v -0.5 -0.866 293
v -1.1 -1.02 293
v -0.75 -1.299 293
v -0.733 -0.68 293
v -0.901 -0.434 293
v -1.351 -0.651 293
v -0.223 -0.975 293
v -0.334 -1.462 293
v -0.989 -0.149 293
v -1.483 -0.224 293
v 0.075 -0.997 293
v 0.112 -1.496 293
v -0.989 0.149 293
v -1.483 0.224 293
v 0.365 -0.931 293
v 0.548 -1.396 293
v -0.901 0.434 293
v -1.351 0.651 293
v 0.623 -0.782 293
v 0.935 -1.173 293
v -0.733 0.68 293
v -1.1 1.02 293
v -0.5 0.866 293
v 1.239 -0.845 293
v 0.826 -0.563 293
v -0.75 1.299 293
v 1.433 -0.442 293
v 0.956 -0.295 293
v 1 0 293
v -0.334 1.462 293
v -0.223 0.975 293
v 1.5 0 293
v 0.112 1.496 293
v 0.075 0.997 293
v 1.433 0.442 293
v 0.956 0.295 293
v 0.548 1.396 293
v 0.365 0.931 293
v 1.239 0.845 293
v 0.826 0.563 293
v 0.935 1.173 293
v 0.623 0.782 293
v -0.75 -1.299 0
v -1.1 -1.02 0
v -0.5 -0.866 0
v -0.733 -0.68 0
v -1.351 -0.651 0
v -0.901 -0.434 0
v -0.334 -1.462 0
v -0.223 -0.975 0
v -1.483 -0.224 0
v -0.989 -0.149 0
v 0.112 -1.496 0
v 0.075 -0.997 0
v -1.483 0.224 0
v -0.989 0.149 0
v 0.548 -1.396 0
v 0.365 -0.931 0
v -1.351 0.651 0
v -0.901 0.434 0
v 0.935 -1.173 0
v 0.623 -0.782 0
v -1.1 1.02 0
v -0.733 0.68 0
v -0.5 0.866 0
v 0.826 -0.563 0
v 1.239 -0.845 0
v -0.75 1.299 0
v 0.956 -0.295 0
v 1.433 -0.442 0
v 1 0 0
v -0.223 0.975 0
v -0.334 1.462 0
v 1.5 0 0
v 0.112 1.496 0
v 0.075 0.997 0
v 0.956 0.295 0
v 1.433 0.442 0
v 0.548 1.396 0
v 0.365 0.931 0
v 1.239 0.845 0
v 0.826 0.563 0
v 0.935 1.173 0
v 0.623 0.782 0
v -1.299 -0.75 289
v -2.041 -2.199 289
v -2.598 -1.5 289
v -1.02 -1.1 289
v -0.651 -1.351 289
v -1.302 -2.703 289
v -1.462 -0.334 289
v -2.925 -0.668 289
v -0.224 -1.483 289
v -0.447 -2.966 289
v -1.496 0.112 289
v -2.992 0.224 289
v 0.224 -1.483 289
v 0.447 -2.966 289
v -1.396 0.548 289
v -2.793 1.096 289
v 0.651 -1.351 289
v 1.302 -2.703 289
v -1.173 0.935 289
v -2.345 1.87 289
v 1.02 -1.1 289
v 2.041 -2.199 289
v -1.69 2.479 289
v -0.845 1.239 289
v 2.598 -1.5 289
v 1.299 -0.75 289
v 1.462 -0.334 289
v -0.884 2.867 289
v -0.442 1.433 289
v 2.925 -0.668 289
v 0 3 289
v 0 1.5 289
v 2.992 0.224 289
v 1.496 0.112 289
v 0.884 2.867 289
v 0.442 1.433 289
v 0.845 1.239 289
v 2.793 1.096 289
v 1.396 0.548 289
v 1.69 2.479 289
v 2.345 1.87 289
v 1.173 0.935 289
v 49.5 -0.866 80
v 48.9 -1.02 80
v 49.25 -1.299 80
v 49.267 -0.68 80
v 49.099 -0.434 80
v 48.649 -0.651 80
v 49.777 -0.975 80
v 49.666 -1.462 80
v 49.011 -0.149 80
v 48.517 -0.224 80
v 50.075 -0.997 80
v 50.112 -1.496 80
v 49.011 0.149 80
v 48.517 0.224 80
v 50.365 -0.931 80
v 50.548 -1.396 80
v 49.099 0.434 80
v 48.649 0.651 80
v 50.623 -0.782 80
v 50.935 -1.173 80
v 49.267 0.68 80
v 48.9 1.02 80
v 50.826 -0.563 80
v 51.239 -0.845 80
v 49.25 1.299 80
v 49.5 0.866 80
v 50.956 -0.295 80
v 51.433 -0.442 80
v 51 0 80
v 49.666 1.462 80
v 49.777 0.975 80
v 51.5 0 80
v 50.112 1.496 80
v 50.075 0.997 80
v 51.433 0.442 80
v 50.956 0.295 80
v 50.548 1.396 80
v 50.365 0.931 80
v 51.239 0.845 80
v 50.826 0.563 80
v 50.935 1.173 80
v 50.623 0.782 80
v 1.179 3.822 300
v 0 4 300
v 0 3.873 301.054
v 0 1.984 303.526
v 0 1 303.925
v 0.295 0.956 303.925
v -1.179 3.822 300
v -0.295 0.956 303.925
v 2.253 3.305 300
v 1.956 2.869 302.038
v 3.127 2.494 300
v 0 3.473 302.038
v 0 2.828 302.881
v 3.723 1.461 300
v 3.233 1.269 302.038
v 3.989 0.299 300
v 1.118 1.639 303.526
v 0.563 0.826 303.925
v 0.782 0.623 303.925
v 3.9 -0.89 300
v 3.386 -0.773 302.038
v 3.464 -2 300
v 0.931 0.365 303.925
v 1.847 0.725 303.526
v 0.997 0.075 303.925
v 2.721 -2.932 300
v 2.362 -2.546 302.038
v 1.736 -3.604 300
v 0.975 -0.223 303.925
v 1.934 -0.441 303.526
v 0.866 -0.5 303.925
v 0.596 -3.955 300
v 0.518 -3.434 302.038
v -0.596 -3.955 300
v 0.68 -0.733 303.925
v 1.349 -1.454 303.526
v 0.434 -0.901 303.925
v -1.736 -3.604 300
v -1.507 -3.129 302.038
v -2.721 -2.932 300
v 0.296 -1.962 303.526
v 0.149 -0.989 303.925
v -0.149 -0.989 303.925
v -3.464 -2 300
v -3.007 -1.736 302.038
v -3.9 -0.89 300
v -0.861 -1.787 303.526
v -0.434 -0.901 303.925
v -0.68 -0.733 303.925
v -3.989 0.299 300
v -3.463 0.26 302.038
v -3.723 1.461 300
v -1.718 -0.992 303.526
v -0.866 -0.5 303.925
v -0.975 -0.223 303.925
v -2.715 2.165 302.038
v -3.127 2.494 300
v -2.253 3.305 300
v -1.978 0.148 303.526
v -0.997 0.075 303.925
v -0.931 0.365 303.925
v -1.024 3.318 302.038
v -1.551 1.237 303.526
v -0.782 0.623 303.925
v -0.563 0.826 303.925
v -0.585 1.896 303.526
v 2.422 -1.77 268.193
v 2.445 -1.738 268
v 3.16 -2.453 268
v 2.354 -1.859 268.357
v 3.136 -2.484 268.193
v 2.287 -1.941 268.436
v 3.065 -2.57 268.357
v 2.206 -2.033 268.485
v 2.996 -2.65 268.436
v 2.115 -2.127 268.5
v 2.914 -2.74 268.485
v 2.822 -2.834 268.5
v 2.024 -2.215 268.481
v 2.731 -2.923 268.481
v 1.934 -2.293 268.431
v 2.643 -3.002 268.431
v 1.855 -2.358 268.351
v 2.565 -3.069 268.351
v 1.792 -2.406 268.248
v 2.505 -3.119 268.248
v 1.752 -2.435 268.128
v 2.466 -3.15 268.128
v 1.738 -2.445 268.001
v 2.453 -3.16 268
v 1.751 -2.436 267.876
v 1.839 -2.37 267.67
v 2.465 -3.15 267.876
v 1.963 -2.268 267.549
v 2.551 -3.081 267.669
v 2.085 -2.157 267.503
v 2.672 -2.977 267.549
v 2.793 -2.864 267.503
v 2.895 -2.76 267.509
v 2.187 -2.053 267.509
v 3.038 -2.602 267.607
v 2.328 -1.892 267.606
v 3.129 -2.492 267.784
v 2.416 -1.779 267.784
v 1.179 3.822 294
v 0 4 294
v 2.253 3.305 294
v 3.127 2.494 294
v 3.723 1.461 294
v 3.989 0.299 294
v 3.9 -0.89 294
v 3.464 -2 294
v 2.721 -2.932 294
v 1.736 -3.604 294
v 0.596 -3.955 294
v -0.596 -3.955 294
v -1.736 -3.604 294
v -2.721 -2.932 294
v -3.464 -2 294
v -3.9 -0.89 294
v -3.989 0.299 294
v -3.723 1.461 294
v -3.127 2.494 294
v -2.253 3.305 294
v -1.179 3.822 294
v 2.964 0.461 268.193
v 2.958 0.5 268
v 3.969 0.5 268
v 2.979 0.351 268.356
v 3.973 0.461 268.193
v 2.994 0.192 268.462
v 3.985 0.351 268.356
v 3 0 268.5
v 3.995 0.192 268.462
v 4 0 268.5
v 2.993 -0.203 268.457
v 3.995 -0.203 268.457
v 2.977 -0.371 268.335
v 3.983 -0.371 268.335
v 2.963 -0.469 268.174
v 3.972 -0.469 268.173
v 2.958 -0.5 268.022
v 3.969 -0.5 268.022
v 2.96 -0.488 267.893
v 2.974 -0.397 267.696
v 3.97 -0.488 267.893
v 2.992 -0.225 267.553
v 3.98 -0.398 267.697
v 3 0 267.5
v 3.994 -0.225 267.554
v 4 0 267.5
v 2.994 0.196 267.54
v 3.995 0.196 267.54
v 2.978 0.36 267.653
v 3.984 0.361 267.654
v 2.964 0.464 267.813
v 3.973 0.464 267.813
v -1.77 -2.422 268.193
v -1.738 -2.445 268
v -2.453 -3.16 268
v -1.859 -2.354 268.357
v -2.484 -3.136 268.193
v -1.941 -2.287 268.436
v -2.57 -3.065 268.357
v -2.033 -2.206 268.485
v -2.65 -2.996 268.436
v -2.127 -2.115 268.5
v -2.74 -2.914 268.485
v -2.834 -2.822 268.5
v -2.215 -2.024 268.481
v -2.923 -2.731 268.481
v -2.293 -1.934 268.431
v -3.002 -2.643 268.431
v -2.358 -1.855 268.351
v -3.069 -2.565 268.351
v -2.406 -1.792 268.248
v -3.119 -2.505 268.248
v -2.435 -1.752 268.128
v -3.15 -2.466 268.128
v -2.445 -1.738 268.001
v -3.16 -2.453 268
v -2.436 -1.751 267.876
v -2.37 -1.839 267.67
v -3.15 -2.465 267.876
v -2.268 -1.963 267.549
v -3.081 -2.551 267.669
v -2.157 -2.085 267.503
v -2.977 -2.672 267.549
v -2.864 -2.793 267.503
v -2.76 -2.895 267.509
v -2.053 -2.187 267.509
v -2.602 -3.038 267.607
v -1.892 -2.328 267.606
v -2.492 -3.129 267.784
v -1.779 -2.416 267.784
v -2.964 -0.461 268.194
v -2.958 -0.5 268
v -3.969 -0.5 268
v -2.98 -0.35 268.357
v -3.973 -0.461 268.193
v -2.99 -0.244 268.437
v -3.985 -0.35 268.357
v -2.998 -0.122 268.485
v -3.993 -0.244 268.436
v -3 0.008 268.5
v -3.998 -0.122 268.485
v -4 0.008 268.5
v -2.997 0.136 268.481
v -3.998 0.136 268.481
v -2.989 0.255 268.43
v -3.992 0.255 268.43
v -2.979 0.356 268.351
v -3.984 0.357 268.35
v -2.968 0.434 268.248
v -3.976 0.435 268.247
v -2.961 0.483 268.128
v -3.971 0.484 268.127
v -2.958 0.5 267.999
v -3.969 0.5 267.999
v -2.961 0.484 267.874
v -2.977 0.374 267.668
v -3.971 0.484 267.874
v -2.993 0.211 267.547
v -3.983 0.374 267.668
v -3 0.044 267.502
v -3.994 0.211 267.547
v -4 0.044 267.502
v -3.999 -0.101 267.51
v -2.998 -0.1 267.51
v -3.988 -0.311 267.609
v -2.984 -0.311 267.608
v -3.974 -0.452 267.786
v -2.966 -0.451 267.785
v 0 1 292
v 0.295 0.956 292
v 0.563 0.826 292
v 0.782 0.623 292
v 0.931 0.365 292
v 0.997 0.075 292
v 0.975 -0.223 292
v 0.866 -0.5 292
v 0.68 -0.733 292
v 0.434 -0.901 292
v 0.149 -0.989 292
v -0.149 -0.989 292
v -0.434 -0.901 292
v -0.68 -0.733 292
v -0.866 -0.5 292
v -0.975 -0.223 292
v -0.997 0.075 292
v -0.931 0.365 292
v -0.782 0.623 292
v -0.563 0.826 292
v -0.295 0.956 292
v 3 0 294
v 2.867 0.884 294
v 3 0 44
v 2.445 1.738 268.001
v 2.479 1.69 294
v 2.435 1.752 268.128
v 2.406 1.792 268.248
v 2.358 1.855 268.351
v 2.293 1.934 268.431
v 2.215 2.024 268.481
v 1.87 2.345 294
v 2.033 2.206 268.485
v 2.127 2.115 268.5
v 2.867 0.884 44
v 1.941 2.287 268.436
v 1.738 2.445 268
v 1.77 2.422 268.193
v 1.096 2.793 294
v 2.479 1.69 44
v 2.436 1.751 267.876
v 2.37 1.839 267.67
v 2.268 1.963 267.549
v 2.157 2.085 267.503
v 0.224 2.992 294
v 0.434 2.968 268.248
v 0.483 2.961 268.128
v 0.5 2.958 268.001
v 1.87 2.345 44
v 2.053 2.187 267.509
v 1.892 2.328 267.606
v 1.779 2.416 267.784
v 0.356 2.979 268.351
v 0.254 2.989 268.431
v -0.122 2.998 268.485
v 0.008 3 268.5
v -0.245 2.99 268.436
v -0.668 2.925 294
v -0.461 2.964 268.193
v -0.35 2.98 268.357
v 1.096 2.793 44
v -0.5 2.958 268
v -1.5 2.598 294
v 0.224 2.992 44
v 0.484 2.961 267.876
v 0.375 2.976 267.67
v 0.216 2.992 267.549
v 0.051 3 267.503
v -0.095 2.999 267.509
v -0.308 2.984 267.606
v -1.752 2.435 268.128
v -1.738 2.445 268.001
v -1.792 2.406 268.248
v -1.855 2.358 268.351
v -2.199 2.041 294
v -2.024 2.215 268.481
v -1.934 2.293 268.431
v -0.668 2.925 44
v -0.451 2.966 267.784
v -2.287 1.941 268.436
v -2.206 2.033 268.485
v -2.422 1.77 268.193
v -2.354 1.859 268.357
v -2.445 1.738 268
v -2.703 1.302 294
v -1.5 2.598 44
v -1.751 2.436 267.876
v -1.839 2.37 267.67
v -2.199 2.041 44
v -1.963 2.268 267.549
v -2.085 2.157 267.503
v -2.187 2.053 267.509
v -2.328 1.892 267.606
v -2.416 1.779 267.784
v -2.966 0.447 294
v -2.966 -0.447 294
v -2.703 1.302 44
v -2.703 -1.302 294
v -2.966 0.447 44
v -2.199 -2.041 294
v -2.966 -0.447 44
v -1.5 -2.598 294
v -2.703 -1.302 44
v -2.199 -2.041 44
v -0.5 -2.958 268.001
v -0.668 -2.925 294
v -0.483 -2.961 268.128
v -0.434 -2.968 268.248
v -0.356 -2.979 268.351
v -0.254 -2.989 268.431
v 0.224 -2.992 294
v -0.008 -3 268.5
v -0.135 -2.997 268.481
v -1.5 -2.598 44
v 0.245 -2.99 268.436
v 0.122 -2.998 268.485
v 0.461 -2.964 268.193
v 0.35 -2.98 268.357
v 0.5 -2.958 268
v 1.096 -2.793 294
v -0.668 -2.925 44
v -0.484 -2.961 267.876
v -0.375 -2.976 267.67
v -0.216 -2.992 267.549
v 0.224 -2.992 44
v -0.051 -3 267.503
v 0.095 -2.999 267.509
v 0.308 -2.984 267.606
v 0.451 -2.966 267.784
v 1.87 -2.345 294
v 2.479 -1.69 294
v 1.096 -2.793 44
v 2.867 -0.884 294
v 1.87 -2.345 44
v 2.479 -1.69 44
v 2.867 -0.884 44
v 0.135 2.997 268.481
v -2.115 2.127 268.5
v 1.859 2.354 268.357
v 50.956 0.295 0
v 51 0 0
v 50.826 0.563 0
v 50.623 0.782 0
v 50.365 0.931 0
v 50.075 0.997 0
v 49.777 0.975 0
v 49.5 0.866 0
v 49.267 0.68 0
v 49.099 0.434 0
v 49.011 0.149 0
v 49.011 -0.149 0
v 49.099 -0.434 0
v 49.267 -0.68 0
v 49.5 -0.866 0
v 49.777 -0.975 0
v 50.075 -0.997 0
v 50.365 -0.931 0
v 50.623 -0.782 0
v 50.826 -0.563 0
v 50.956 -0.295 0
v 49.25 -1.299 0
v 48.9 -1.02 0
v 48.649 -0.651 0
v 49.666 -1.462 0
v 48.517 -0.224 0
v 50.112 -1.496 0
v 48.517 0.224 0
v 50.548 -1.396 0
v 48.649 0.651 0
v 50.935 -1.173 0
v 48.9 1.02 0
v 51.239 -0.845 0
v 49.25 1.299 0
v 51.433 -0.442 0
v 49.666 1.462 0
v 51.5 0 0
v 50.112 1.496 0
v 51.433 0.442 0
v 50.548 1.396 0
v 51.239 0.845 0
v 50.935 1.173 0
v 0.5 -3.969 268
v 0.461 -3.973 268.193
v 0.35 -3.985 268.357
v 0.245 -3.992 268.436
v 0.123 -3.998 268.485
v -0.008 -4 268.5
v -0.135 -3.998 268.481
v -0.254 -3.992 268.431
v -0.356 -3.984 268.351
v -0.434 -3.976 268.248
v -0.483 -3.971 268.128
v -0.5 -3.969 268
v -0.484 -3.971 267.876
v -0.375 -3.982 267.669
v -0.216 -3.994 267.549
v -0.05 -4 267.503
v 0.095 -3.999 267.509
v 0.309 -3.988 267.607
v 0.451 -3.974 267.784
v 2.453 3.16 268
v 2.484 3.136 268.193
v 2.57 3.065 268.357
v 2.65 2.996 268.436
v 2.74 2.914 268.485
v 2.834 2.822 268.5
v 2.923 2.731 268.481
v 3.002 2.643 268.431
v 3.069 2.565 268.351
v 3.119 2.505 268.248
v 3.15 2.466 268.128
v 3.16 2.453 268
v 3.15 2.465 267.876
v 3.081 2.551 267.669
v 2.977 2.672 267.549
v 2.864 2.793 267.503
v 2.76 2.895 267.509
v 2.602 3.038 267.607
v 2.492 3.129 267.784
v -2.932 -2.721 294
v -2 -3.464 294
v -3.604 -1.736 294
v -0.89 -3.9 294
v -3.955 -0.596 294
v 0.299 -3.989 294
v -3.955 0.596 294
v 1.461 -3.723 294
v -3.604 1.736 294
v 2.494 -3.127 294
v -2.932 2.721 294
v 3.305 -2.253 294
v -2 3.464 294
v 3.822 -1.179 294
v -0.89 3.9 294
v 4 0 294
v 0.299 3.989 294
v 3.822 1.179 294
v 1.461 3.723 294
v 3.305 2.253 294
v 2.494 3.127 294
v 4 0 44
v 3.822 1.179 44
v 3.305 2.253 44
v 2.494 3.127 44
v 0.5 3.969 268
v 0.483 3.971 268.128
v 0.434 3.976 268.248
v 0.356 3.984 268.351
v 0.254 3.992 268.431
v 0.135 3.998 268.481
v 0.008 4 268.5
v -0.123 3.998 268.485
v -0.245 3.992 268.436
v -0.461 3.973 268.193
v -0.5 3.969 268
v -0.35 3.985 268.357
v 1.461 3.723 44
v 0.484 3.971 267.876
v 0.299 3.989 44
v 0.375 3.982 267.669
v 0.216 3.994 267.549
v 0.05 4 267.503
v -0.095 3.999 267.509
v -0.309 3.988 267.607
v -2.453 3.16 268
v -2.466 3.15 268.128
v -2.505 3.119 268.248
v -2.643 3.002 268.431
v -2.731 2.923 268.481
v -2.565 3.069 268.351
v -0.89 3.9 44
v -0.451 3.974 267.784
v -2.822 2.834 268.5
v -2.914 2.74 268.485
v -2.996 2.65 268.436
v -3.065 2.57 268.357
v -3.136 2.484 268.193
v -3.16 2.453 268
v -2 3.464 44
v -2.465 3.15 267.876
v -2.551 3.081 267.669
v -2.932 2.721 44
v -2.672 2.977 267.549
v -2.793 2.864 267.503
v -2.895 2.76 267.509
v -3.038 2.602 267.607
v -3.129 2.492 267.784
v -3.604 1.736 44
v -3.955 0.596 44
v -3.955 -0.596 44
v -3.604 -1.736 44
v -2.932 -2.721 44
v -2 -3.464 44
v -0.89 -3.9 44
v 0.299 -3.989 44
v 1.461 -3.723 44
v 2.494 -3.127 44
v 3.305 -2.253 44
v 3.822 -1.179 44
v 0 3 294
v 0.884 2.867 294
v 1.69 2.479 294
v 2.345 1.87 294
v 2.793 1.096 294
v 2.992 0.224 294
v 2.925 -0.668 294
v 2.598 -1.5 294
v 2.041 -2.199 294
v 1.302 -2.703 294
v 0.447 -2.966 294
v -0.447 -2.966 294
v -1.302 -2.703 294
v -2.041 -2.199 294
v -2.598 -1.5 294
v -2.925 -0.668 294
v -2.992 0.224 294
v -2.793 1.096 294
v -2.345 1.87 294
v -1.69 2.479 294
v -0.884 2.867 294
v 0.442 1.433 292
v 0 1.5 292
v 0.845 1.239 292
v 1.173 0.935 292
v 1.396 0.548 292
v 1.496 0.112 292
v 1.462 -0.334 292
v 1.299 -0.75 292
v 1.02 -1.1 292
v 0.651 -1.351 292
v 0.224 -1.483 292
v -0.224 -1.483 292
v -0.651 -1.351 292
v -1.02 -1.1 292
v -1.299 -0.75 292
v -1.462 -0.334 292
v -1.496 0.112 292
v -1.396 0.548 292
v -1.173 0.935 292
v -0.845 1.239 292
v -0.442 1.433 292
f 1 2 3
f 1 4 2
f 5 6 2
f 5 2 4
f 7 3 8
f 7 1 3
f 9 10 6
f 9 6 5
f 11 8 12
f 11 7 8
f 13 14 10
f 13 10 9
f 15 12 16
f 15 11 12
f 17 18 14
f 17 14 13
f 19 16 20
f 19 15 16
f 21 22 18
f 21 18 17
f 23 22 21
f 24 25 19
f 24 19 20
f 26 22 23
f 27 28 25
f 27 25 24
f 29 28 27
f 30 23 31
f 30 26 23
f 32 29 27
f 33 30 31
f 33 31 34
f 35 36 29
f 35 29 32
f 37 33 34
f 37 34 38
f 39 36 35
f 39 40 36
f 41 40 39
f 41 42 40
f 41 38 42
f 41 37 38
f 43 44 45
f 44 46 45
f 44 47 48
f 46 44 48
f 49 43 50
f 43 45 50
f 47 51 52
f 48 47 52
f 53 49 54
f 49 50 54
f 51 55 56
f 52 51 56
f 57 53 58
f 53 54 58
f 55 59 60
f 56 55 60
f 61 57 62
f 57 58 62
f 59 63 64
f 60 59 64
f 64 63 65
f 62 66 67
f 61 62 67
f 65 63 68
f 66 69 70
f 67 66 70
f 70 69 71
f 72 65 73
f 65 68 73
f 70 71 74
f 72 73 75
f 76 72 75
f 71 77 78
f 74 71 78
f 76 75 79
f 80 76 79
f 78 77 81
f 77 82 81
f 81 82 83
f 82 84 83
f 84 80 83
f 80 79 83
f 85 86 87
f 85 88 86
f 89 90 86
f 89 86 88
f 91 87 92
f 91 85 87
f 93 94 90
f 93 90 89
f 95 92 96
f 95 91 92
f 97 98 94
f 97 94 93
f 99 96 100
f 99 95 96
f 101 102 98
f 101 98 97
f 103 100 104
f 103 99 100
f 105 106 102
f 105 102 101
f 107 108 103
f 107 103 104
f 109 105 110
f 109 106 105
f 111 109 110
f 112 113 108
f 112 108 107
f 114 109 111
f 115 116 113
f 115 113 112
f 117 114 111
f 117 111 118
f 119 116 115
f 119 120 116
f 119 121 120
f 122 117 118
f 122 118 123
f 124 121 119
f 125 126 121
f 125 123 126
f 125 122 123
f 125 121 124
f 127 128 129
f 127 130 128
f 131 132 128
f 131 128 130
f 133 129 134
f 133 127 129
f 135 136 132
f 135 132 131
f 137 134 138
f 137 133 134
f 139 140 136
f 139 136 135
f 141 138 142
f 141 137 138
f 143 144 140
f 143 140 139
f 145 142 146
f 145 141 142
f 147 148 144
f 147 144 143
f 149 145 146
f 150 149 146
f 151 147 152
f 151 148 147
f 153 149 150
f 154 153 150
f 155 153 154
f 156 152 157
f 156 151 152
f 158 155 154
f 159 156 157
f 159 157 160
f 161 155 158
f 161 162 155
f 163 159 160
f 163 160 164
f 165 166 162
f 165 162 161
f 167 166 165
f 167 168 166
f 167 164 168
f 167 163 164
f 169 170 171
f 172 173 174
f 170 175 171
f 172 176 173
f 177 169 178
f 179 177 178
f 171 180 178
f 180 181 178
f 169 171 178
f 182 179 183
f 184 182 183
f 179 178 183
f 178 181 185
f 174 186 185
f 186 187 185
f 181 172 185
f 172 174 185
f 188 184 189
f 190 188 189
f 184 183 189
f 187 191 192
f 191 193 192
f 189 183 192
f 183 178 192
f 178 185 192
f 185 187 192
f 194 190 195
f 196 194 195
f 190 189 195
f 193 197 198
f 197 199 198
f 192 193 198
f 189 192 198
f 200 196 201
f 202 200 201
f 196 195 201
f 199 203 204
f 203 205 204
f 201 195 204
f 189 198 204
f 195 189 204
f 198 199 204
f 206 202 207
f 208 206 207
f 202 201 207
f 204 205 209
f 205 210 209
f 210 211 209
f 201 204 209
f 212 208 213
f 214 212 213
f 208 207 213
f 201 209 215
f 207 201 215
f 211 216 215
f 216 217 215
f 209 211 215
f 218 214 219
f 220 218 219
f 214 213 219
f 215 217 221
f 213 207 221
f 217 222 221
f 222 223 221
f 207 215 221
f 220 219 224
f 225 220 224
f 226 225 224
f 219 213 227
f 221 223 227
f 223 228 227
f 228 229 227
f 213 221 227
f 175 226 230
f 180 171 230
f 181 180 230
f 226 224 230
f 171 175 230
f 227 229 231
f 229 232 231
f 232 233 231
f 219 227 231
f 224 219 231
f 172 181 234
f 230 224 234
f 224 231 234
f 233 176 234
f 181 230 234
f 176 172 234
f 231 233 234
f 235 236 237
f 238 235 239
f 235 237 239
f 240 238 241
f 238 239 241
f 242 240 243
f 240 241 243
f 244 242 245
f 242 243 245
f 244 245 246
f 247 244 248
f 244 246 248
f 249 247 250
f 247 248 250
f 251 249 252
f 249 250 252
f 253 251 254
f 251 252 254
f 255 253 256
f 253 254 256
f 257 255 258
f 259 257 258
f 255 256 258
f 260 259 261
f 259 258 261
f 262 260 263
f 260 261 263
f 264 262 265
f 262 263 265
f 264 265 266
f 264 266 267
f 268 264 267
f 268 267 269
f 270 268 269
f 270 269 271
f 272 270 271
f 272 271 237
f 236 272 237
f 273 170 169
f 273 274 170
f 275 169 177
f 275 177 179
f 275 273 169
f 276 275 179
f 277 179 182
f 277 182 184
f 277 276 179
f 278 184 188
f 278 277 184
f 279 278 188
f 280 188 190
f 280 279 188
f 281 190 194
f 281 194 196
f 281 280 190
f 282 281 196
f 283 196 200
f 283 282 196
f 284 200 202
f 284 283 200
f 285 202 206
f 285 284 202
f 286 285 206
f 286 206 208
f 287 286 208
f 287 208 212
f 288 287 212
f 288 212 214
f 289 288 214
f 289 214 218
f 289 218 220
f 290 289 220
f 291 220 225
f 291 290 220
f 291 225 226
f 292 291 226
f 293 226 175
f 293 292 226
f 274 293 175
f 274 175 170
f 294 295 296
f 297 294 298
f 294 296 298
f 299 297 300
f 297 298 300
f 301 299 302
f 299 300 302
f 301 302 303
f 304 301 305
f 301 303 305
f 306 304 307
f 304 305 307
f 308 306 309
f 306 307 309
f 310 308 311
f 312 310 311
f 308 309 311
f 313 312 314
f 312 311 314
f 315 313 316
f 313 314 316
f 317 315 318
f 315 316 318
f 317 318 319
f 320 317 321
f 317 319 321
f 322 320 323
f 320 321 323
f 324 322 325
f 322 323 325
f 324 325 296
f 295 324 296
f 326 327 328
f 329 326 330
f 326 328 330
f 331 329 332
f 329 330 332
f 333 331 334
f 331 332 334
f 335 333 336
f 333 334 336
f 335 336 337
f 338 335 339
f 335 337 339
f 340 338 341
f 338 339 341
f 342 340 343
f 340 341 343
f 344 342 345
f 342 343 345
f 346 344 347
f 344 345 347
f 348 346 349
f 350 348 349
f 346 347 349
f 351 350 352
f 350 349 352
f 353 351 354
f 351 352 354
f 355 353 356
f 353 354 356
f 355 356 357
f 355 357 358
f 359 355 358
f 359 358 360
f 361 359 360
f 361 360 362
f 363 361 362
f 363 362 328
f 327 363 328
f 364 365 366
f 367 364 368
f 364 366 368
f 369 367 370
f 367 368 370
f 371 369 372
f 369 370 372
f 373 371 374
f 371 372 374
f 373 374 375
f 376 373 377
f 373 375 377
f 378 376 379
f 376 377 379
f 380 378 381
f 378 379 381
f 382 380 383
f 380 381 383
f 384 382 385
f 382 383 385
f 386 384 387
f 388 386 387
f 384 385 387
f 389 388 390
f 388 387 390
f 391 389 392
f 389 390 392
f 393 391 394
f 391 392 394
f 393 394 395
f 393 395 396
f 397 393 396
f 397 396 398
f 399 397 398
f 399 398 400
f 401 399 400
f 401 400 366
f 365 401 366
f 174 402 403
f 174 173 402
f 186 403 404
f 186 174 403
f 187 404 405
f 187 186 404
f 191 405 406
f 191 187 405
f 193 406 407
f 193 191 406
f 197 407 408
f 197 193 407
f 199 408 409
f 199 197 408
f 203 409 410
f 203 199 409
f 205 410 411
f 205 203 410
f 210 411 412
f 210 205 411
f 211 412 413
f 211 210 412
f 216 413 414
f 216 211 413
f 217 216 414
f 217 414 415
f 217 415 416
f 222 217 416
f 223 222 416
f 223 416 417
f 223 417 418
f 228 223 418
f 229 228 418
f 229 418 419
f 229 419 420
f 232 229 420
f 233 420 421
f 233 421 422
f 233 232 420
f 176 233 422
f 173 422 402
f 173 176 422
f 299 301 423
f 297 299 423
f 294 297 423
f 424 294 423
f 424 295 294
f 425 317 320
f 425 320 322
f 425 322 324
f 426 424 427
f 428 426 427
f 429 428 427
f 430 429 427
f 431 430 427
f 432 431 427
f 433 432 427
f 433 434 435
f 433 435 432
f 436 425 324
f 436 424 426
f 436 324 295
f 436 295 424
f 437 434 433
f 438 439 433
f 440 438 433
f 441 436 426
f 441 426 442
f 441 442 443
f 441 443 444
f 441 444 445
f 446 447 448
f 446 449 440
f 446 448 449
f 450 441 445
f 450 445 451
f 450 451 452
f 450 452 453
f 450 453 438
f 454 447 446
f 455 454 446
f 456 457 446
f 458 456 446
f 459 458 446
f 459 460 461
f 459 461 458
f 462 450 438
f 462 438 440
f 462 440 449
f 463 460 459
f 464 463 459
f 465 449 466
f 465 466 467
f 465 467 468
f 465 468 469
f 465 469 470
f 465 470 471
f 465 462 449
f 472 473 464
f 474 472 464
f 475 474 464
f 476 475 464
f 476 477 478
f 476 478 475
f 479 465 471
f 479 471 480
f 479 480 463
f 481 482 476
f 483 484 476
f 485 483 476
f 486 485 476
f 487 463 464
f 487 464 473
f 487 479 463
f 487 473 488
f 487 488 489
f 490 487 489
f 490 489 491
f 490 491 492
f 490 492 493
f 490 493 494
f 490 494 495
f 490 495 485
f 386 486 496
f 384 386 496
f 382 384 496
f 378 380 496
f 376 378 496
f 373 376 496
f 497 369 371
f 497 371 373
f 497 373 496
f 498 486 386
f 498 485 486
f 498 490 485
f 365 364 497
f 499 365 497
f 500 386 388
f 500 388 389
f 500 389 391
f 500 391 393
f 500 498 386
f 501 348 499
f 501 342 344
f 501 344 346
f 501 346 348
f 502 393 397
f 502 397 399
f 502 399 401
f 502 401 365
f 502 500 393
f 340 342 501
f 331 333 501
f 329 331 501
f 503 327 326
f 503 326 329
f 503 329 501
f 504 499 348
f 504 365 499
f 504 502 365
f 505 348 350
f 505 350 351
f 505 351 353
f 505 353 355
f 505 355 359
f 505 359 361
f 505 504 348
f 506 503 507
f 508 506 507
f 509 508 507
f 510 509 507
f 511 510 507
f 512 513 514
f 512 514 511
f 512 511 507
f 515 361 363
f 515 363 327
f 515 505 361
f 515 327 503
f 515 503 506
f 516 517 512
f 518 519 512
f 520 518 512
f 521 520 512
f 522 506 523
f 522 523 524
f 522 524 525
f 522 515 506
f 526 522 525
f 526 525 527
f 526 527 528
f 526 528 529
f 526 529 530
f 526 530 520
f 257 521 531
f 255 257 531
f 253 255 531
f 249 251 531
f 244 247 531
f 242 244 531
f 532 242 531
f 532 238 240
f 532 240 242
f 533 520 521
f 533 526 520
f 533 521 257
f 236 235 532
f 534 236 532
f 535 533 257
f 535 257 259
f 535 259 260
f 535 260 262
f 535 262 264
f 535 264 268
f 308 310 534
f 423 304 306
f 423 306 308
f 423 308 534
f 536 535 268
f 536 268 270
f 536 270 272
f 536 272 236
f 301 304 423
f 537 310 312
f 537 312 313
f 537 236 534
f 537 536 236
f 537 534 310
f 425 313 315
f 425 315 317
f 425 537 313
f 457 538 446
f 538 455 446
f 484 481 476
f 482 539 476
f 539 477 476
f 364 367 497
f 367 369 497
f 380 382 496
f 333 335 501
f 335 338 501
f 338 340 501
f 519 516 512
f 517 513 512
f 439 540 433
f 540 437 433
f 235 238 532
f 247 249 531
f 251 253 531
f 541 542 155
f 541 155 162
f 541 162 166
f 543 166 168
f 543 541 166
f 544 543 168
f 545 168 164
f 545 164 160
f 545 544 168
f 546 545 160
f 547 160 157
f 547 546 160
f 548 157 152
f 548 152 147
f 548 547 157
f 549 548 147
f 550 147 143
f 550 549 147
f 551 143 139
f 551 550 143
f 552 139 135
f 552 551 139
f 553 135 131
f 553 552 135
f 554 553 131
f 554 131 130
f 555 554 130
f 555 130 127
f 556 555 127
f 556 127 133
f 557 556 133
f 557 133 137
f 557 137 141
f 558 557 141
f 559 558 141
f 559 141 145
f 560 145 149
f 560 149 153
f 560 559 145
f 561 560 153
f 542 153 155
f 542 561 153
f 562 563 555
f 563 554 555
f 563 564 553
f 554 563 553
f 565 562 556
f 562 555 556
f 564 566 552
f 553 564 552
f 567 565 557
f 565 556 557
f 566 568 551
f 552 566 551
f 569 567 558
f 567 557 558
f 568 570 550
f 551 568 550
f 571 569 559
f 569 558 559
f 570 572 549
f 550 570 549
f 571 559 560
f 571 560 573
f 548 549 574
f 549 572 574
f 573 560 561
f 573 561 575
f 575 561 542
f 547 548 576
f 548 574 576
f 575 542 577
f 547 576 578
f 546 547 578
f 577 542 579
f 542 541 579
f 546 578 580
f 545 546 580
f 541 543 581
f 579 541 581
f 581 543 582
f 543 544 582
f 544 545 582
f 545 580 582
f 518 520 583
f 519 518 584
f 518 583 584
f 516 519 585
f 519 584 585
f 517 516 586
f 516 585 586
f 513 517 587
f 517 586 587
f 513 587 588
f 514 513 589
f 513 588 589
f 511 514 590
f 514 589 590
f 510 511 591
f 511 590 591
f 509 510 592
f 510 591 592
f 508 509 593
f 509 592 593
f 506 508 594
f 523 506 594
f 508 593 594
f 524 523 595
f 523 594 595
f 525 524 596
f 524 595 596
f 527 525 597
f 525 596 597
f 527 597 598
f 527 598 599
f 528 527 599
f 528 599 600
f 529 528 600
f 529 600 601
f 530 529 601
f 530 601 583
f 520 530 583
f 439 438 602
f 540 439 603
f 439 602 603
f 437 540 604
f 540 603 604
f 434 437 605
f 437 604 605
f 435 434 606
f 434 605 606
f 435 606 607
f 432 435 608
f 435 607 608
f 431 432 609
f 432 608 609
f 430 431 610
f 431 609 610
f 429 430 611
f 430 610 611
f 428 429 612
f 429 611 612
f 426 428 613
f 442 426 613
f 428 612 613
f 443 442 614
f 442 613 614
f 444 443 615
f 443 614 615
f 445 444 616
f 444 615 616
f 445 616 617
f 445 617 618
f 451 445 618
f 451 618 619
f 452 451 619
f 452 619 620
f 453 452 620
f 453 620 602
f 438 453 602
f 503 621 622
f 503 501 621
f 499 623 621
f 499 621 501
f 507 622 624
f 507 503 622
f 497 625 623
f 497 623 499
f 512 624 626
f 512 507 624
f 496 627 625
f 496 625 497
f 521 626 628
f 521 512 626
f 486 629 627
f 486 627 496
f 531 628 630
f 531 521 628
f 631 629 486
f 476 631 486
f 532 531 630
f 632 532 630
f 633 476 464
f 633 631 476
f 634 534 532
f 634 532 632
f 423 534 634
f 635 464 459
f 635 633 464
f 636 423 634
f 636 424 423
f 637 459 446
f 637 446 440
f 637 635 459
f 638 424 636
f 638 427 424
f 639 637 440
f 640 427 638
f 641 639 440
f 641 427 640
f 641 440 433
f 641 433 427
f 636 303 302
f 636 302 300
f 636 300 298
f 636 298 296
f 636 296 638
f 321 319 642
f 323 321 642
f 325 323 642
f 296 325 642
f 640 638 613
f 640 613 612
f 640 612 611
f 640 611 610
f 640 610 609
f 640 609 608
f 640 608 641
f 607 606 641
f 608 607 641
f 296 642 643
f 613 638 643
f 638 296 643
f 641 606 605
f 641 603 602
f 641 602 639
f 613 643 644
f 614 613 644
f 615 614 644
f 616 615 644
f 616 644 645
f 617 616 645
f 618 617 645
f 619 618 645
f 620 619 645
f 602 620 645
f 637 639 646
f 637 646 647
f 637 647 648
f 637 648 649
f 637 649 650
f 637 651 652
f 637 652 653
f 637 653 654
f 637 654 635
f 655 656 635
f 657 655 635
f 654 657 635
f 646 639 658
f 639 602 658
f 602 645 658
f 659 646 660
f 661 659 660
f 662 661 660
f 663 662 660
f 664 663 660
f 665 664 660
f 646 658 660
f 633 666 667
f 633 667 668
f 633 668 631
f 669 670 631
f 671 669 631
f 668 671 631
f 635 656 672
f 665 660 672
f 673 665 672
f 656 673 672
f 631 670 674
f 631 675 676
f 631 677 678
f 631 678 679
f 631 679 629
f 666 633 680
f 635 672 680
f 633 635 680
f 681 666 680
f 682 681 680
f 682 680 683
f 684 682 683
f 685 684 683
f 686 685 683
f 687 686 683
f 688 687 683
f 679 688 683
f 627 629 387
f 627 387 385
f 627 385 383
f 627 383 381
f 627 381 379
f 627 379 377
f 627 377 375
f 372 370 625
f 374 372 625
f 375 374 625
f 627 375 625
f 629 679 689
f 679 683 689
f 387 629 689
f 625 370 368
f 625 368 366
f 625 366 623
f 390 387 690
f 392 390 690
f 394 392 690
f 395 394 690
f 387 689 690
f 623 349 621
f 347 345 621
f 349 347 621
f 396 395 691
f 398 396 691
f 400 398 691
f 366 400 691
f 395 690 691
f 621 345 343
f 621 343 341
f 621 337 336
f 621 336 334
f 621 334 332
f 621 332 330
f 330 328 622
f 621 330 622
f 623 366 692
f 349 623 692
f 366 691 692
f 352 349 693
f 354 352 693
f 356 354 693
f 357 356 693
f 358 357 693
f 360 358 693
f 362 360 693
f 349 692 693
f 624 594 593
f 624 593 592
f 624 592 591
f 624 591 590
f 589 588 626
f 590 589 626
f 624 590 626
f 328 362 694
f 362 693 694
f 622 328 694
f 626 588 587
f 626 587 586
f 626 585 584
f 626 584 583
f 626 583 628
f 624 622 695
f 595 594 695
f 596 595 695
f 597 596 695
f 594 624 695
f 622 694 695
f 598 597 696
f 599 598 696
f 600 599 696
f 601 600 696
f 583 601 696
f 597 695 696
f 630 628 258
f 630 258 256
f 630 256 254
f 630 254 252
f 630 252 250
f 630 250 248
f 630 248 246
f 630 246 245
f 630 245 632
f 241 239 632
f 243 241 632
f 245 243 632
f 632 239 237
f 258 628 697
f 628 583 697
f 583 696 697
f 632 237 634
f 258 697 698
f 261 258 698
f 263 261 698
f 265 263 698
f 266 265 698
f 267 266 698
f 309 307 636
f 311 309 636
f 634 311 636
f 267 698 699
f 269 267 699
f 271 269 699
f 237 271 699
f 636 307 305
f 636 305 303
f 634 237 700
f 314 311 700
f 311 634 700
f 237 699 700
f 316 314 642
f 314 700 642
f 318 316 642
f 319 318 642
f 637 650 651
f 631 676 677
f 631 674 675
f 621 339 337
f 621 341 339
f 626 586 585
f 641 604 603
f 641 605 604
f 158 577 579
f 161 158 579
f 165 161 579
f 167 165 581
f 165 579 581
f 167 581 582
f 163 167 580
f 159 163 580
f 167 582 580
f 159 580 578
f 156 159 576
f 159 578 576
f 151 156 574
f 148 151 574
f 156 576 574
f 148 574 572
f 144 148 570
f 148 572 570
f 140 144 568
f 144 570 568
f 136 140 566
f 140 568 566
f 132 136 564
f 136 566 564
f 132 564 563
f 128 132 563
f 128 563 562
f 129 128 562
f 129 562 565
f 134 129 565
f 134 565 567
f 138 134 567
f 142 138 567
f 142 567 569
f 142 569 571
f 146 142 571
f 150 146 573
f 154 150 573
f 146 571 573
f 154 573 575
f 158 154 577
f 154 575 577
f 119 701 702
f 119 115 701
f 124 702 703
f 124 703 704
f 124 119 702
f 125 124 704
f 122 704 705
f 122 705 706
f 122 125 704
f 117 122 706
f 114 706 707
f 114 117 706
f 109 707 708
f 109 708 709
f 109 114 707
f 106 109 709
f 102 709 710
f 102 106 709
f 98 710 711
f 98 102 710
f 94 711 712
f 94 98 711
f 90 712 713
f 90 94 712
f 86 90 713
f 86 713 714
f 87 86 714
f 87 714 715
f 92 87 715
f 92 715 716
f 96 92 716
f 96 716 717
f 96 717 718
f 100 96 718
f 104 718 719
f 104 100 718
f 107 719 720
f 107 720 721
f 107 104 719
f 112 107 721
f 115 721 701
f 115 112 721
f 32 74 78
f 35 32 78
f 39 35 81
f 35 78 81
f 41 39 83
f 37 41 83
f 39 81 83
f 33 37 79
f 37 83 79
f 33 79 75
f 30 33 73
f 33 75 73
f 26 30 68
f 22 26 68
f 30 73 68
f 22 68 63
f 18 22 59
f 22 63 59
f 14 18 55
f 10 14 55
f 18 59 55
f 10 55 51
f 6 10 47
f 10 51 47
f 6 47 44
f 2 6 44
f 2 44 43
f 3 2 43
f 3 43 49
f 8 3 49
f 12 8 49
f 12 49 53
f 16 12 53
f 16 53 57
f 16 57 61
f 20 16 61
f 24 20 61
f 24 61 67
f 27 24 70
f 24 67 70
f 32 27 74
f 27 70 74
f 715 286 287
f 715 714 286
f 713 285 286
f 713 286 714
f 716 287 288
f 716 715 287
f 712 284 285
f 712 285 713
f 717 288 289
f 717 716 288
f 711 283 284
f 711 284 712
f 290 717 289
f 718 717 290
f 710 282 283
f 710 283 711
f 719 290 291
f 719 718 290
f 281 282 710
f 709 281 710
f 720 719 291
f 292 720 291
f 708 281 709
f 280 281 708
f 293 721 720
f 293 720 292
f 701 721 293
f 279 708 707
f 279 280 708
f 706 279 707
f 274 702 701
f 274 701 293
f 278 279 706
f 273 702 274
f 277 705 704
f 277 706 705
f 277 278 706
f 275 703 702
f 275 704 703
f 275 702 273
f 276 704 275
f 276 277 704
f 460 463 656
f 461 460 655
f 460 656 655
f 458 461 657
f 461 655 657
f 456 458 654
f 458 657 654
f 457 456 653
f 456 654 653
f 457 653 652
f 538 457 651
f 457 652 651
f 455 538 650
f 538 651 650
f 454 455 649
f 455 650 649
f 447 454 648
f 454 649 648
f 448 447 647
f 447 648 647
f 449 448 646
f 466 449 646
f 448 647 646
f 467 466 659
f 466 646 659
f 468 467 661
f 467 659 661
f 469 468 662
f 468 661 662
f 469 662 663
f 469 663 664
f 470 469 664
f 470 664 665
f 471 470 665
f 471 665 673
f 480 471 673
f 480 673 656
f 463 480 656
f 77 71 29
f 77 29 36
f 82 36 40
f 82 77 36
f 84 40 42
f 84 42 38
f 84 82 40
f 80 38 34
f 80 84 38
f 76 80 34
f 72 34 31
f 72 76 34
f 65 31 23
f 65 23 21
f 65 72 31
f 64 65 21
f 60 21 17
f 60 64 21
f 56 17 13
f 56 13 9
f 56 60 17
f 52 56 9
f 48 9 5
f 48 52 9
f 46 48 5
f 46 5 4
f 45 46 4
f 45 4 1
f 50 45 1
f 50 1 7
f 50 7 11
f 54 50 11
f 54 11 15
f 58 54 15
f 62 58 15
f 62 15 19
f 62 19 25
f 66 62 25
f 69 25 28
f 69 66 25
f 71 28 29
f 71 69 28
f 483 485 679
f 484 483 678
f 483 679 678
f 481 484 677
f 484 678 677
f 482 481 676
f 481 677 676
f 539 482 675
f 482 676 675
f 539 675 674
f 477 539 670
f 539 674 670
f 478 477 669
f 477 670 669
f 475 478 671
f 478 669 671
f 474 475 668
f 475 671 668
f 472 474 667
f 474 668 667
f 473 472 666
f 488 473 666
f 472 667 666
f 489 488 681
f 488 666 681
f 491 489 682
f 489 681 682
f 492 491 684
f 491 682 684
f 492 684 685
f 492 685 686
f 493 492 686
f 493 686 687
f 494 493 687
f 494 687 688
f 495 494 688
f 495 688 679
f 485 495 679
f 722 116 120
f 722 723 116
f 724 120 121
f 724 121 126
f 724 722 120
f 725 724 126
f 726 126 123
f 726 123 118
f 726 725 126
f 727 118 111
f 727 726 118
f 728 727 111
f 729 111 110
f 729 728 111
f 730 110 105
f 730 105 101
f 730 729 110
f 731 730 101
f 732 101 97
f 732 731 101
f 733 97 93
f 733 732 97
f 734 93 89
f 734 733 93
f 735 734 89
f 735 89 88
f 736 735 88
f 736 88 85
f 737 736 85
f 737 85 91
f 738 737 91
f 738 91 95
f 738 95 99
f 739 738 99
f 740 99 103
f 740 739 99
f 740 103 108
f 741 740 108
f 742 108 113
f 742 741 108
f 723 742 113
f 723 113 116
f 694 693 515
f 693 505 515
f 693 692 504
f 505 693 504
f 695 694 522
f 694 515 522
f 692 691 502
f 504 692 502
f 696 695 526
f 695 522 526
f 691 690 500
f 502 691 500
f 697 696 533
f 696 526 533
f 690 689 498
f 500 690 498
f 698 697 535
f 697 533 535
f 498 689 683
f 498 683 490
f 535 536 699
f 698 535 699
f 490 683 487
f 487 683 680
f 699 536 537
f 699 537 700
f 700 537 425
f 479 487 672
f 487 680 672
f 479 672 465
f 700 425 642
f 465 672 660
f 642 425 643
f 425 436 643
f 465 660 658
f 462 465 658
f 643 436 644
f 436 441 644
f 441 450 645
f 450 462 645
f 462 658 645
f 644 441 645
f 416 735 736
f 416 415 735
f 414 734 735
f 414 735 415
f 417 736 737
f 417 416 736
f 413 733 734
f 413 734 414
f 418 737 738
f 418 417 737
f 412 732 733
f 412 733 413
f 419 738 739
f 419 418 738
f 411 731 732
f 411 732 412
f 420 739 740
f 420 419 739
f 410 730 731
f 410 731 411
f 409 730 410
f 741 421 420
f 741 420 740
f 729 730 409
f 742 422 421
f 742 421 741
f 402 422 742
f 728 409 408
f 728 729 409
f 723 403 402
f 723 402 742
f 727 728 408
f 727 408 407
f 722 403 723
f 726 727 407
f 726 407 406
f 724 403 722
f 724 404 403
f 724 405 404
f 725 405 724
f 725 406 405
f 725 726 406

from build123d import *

# Parameters (mm, degrees)
SKETCH_R           = 4
SKETCH_R_2         = 3
PAD_DEPTH          = 250
SKETCH001_W        = 5
SKETCH001_H        = 5
PAD001_DEPTH       = 10
SKETCH002_R        = 0.5
POCKET_DEPTH       = 3
POLARPATTERN_COUNT = 8
SKETCH003_W        = 8.429369
SKETCH003_H        = 7.155477
POCKET001_DEPTH    = 10
SKETCH004_R        = 1.5
SKETCH004_R_2      = 1
PAD002_DEPTH       = 293
SKETCH006_R        = 1.5
SKETCH006_R_2      = 1
PAD003_DEPTH       = 80


with BuildPart() as pocket001:
    # Sketch → Pad (new body)
    with BuildSketch(Plane.XY.offset(44)):
        Circle(SKETCH_R)
        Circle(SKETCH_R_2, mode=Mode.SUBTRACT)
    extrude(amount=PAD_DEPTH)

    # Sketch001 → Pad001 (new body)
    with BuildSketch(Plane.XY.offset(294)):
        with Locations((2.5, -2.5)):
            Rectangle(SKETCH001_W, SKETCH001_H)
    extrude(amount=PAD001_DEPTH)

    # Sketch002 → Pocket (cut)
    with BuildSketch(Plane(origin=(0, -5, 44), x_dir=(1, 0, 0), z_dir=(0, -1, 0))):
        with Locations((0, 224)):
            Circle(SKETCH002_R)
    pocket = extrude(amount=-POCKET_DEPTH, mode=Mode.SUBTRACT)

    # PolarPattern: Pocket ×8 about axis
    polarpattern_axis = Axis((0, 0, 299), (0, 0, 1))
    for i in range(1, POLARPATTERN_COUNT):
        add(pocket.rotate(polarpattern_axis, i * 360 / POLARPATTERN_COUNT), mode=Mode.SUBTRACT)

    # Sketch003 → Pocket001 (cut)
    with BuildSketch(Plane.XY.offset(304)):
        with Locations((3.121665, -2.696092)):
            Rectangle(SKETCH003_W, SKETCH003_H)
    extrude(amount=-POCKET001_DEPTH, mode=Mode.SUBTRACT)


with BuildPart() as pad002:
    # Sketch004 → Pad002 (new body)
    with BuildSketch(Plane.XY):
        Circle(SKETCH004_R)
        Circle(SKETCH004_R_2, mode=Mode.SUBTRACT)
    extrude(amount=PAD002_DEPTH)


with BuildPart() as revolution:
    # Sketch005 → Revolution (revolve)
    with BuildSketch(Plane(origin=(0, 0, 300), x_dir=(0, 0, -1), z_dir=(1, 0, 0))):
        with BuildLine():
            Line((0, 4), (6, 4))
            Line((6, 4), (6, 3))
            Line((6, 3), (11, 3))
            Line((11, 3), (11, 1.5))
            Line((11, 1.5), (8, 1.5))
            Line((8, 1.5), (8, 1))
            Line((8, 1), (-3.925111, 1))
            ThreePointArc((0, 4), (-2.481046, 3.178377), (-3.925111, 1))
        make_face()
    revolve(axis=Axis((0, 0, 300), (0, 0, -1)))


with BuildPart() as pad003:
    # Sketch006 → Pad003 (new body)
    with BuildSketch(Plane(origin=(50, 0, 0), x_dir=(1, 0, 0), z_dir=(0, 0, 1))):
        Circle(SKETCH006_R)
        Circle(SKETCH006_R_2, mode=Mode.SUBTRACT)
    extrude(amount=PAD003_DEPTH)


solid = Compound([pocket001.part, pad002.part, revolution.part, pad003.part])
